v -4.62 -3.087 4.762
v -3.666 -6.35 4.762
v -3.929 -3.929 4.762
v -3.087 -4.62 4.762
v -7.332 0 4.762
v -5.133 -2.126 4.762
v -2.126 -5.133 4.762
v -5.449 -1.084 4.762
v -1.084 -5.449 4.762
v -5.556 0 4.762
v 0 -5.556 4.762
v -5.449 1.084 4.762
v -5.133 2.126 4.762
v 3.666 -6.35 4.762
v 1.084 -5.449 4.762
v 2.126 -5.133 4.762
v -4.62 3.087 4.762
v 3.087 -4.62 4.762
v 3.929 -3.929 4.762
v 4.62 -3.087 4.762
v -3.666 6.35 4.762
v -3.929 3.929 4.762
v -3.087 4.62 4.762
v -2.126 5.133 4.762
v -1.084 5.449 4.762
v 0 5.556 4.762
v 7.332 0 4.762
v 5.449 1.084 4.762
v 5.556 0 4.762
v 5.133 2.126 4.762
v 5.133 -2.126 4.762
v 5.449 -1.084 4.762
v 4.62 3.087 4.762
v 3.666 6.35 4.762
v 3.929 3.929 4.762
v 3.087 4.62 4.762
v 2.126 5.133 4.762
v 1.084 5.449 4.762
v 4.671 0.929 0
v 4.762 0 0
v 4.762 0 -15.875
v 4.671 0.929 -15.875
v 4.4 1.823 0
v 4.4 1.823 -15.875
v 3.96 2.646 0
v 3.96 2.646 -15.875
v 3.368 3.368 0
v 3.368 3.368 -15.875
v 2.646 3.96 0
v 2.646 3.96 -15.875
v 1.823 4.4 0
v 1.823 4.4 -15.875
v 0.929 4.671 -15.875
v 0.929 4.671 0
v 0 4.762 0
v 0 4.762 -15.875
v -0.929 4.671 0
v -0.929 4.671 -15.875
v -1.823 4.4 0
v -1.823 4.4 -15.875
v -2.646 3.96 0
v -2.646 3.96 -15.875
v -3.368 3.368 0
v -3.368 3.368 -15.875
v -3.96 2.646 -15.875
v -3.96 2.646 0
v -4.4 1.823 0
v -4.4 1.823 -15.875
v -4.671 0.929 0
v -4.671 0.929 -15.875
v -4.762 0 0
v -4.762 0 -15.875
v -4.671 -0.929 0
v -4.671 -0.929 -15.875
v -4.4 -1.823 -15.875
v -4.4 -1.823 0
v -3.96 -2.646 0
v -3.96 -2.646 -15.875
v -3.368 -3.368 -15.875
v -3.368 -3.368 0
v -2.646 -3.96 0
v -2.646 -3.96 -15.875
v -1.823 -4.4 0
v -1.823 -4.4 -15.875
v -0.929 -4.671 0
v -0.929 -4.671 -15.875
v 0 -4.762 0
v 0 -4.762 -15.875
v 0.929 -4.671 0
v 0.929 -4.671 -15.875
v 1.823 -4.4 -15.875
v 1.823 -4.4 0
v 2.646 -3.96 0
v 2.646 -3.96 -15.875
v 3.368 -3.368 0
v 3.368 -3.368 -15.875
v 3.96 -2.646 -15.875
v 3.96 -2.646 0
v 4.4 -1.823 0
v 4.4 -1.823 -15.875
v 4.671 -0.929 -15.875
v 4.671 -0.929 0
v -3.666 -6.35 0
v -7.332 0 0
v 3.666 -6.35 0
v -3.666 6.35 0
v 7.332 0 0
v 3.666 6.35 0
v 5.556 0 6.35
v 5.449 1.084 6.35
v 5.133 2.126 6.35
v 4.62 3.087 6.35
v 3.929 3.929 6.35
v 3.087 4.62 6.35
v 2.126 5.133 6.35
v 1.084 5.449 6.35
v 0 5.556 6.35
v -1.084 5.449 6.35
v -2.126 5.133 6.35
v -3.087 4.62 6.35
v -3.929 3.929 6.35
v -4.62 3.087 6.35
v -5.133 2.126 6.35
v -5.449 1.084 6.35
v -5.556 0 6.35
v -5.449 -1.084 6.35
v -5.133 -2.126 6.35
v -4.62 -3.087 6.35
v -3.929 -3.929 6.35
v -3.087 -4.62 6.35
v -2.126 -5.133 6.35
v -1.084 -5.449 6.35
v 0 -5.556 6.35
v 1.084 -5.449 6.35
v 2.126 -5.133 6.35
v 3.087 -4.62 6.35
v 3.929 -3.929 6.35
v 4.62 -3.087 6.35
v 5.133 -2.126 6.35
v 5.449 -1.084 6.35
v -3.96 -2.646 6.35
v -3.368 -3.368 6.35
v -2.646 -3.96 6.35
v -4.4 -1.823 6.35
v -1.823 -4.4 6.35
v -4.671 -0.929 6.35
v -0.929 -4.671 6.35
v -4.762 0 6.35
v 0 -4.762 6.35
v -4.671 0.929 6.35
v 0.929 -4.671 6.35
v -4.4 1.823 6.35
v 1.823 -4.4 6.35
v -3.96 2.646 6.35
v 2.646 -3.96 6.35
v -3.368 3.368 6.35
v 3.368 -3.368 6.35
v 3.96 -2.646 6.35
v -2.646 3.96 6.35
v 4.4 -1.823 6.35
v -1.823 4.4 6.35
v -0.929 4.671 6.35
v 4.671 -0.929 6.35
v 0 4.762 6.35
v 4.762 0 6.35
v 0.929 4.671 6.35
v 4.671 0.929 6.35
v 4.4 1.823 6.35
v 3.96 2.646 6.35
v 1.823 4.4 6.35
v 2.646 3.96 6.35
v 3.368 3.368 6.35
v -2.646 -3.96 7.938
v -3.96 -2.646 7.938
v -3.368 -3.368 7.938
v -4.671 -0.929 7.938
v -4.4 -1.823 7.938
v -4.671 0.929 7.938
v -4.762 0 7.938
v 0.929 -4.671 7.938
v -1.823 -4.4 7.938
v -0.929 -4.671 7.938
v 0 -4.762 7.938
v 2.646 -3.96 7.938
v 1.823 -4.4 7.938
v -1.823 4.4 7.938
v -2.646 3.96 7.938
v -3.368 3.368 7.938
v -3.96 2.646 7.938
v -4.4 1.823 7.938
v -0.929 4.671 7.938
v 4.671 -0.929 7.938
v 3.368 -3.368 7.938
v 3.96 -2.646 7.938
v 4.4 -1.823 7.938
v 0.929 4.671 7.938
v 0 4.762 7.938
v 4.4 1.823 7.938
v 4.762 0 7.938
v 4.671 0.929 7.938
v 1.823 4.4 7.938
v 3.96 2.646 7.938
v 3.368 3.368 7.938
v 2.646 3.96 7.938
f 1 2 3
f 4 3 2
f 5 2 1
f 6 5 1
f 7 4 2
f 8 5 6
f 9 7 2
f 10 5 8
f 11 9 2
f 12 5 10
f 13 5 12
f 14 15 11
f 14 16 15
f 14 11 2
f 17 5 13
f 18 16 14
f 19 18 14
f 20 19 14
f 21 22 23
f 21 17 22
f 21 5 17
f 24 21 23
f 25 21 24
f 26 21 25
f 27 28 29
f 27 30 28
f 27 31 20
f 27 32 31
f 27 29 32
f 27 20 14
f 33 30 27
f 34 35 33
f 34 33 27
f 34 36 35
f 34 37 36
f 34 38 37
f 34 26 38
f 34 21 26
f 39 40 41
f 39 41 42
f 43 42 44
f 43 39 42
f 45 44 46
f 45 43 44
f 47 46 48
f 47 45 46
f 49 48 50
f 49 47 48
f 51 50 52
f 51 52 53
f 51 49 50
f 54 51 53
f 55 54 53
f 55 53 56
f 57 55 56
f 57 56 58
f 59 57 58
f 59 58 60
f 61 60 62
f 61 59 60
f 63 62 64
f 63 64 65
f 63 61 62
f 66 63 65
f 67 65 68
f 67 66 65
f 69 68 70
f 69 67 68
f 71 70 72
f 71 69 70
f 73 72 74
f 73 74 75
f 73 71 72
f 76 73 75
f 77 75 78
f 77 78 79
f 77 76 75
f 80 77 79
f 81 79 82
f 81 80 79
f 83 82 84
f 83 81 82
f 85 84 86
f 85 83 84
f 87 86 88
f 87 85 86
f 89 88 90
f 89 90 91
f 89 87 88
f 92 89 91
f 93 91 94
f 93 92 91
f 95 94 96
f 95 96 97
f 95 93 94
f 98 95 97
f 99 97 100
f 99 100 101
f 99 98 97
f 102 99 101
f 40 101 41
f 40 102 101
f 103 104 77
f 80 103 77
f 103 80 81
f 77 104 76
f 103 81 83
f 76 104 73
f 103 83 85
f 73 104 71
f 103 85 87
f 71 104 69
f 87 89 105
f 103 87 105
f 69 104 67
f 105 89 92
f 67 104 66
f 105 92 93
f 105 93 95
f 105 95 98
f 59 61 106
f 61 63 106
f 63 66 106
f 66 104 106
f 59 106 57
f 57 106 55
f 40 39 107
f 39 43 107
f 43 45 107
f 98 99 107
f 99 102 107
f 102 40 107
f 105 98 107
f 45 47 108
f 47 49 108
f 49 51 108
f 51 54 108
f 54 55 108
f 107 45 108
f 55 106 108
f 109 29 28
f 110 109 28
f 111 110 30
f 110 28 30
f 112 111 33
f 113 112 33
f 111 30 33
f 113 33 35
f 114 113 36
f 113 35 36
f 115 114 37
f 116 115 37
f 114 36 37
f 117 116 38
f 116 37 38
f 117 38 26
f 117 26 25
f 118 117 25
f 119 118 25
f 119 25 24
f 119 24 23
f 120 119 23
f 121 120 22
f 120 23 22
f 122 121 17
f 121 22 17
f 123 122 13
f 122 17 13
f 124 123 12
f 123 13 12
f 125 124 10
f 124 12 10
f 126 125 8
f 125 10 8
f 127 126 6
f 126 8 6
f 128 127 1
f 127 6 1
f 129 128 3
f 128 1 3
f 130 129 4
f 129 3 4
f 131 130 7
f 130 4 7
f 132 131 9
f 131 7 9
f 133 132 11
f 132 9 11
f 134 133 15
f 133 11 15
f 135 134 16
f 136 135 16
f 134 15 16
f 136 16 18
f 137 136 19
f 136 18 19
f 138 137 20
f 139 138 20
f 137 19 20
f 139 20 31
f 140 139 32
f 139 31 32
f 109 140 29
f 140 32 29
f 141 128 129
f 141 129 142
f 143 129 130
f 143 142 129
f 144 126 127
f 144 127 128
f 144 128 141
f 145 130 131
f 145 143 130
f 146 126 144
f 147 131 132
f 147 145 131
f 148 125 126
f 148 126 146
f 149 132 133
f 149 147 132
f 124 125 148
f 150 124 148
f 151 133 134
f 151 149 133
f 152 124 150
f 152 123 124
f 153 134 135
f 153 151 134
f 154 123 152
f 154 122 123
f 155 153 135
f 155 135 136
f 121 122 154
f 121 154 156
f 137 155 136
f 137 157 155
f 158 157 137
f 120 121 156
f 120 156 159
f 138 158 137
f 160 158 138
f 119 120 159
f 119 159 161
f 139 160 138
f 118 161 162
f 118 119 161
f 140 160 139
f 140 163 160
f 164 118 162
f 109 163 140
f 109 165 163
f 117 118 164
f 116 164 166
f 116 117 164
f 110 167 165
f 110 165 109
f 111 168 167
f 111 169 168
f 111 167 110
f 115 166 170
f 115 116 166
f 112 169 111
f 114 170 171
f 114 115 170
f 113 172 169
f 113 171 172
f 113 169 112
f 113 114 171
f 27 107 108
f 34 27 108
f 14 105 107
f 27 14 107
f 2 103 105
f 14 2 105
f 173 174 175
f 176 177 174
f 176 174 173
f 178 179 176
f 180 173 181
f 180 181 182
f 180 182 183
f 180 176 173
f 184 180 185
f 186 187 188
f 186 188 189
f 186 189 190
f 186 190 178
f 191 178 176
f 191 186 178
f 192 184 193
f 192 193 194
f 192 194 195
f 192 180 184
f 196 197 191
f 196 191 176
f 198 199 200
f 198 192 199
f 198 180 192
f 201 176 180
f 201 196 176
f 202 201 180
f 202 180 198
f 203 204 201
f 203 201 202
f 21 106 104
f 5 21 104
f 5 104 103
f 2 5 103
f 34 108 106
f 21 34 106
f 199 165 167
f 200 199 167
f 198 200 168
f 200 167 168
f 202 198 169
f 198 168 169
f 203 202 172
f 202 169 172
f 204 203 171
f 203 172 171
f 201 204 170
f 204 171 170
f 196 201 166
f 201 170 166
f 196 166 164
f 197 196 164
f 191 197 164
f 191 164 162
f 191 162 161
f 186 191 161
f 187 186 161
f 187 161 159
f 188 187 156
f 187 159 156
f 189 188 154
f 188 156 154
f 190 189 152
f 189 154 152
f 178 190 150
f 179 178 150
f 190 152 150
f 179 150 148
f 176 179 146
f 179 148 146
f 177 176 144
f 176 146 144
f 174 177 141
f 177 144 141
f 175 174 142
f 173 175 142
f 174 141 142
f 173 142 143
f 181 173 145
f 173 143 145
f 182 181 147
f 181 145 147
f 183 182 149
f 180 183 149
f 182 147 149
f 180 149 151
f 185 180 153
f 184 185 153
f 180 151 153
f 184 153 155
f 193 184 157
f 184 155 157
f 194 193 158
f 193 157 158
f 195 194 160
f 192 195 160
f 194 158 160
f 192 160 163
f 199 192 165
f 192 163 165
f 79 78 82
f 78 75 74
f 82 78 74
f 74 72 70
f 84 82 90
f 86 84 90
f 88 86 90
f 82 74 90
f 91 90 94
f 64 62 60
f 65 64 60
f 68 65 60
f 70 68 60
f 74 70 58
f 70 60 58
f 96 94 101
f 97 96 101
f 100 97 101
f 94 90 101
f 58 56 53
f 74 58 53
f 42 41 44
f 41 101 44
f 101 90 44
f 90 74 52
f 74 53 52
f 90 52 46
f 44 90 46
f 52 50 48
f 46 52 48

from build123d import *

# Parameters (mm, degrees)
F1_DEPTH = 4.7625
F2_R     = 4.7625
F3_DEPTH = 15.875
F4_R     = 5.55625
F5_DEPTH = 1.5875
F6_R     = 4.7625
F7_DEPTH = 1.5875


with BuildPart() as f1:
    # F0 (on Top) → F1 (new body)
    with BuildSketch(Plane.XY):
        Polygon((-3.6661742094, -6.35), (3.6661742094, -6.35), (7.3323484187, 0), (3.6661742094, 6.35), (-3.6661742094, 6.35), (-7.3323484187, 0), align=None)
    extrude(amount=F1_DEPTH)

    # F2 (on Top) → F3 (join)
    with BuildSketch(Plane.XY):
        Circle(F2_R)
    extrude(amount=-F3_DEPTH)

    # F4 (on face) → F5 (join)
    with BuildSketch(Plane.XY.offset(4.7625)):
        Circle(F4_R)
    extrude(amount=F5_DEPTH)

    # F6 (on face) → F7 (join)
    with BuildSketch(Plane.XY.offset(6.35)):
        Circle(F6_R)
    extrude(amount=F7_DEPTH)


solid = f1.part
